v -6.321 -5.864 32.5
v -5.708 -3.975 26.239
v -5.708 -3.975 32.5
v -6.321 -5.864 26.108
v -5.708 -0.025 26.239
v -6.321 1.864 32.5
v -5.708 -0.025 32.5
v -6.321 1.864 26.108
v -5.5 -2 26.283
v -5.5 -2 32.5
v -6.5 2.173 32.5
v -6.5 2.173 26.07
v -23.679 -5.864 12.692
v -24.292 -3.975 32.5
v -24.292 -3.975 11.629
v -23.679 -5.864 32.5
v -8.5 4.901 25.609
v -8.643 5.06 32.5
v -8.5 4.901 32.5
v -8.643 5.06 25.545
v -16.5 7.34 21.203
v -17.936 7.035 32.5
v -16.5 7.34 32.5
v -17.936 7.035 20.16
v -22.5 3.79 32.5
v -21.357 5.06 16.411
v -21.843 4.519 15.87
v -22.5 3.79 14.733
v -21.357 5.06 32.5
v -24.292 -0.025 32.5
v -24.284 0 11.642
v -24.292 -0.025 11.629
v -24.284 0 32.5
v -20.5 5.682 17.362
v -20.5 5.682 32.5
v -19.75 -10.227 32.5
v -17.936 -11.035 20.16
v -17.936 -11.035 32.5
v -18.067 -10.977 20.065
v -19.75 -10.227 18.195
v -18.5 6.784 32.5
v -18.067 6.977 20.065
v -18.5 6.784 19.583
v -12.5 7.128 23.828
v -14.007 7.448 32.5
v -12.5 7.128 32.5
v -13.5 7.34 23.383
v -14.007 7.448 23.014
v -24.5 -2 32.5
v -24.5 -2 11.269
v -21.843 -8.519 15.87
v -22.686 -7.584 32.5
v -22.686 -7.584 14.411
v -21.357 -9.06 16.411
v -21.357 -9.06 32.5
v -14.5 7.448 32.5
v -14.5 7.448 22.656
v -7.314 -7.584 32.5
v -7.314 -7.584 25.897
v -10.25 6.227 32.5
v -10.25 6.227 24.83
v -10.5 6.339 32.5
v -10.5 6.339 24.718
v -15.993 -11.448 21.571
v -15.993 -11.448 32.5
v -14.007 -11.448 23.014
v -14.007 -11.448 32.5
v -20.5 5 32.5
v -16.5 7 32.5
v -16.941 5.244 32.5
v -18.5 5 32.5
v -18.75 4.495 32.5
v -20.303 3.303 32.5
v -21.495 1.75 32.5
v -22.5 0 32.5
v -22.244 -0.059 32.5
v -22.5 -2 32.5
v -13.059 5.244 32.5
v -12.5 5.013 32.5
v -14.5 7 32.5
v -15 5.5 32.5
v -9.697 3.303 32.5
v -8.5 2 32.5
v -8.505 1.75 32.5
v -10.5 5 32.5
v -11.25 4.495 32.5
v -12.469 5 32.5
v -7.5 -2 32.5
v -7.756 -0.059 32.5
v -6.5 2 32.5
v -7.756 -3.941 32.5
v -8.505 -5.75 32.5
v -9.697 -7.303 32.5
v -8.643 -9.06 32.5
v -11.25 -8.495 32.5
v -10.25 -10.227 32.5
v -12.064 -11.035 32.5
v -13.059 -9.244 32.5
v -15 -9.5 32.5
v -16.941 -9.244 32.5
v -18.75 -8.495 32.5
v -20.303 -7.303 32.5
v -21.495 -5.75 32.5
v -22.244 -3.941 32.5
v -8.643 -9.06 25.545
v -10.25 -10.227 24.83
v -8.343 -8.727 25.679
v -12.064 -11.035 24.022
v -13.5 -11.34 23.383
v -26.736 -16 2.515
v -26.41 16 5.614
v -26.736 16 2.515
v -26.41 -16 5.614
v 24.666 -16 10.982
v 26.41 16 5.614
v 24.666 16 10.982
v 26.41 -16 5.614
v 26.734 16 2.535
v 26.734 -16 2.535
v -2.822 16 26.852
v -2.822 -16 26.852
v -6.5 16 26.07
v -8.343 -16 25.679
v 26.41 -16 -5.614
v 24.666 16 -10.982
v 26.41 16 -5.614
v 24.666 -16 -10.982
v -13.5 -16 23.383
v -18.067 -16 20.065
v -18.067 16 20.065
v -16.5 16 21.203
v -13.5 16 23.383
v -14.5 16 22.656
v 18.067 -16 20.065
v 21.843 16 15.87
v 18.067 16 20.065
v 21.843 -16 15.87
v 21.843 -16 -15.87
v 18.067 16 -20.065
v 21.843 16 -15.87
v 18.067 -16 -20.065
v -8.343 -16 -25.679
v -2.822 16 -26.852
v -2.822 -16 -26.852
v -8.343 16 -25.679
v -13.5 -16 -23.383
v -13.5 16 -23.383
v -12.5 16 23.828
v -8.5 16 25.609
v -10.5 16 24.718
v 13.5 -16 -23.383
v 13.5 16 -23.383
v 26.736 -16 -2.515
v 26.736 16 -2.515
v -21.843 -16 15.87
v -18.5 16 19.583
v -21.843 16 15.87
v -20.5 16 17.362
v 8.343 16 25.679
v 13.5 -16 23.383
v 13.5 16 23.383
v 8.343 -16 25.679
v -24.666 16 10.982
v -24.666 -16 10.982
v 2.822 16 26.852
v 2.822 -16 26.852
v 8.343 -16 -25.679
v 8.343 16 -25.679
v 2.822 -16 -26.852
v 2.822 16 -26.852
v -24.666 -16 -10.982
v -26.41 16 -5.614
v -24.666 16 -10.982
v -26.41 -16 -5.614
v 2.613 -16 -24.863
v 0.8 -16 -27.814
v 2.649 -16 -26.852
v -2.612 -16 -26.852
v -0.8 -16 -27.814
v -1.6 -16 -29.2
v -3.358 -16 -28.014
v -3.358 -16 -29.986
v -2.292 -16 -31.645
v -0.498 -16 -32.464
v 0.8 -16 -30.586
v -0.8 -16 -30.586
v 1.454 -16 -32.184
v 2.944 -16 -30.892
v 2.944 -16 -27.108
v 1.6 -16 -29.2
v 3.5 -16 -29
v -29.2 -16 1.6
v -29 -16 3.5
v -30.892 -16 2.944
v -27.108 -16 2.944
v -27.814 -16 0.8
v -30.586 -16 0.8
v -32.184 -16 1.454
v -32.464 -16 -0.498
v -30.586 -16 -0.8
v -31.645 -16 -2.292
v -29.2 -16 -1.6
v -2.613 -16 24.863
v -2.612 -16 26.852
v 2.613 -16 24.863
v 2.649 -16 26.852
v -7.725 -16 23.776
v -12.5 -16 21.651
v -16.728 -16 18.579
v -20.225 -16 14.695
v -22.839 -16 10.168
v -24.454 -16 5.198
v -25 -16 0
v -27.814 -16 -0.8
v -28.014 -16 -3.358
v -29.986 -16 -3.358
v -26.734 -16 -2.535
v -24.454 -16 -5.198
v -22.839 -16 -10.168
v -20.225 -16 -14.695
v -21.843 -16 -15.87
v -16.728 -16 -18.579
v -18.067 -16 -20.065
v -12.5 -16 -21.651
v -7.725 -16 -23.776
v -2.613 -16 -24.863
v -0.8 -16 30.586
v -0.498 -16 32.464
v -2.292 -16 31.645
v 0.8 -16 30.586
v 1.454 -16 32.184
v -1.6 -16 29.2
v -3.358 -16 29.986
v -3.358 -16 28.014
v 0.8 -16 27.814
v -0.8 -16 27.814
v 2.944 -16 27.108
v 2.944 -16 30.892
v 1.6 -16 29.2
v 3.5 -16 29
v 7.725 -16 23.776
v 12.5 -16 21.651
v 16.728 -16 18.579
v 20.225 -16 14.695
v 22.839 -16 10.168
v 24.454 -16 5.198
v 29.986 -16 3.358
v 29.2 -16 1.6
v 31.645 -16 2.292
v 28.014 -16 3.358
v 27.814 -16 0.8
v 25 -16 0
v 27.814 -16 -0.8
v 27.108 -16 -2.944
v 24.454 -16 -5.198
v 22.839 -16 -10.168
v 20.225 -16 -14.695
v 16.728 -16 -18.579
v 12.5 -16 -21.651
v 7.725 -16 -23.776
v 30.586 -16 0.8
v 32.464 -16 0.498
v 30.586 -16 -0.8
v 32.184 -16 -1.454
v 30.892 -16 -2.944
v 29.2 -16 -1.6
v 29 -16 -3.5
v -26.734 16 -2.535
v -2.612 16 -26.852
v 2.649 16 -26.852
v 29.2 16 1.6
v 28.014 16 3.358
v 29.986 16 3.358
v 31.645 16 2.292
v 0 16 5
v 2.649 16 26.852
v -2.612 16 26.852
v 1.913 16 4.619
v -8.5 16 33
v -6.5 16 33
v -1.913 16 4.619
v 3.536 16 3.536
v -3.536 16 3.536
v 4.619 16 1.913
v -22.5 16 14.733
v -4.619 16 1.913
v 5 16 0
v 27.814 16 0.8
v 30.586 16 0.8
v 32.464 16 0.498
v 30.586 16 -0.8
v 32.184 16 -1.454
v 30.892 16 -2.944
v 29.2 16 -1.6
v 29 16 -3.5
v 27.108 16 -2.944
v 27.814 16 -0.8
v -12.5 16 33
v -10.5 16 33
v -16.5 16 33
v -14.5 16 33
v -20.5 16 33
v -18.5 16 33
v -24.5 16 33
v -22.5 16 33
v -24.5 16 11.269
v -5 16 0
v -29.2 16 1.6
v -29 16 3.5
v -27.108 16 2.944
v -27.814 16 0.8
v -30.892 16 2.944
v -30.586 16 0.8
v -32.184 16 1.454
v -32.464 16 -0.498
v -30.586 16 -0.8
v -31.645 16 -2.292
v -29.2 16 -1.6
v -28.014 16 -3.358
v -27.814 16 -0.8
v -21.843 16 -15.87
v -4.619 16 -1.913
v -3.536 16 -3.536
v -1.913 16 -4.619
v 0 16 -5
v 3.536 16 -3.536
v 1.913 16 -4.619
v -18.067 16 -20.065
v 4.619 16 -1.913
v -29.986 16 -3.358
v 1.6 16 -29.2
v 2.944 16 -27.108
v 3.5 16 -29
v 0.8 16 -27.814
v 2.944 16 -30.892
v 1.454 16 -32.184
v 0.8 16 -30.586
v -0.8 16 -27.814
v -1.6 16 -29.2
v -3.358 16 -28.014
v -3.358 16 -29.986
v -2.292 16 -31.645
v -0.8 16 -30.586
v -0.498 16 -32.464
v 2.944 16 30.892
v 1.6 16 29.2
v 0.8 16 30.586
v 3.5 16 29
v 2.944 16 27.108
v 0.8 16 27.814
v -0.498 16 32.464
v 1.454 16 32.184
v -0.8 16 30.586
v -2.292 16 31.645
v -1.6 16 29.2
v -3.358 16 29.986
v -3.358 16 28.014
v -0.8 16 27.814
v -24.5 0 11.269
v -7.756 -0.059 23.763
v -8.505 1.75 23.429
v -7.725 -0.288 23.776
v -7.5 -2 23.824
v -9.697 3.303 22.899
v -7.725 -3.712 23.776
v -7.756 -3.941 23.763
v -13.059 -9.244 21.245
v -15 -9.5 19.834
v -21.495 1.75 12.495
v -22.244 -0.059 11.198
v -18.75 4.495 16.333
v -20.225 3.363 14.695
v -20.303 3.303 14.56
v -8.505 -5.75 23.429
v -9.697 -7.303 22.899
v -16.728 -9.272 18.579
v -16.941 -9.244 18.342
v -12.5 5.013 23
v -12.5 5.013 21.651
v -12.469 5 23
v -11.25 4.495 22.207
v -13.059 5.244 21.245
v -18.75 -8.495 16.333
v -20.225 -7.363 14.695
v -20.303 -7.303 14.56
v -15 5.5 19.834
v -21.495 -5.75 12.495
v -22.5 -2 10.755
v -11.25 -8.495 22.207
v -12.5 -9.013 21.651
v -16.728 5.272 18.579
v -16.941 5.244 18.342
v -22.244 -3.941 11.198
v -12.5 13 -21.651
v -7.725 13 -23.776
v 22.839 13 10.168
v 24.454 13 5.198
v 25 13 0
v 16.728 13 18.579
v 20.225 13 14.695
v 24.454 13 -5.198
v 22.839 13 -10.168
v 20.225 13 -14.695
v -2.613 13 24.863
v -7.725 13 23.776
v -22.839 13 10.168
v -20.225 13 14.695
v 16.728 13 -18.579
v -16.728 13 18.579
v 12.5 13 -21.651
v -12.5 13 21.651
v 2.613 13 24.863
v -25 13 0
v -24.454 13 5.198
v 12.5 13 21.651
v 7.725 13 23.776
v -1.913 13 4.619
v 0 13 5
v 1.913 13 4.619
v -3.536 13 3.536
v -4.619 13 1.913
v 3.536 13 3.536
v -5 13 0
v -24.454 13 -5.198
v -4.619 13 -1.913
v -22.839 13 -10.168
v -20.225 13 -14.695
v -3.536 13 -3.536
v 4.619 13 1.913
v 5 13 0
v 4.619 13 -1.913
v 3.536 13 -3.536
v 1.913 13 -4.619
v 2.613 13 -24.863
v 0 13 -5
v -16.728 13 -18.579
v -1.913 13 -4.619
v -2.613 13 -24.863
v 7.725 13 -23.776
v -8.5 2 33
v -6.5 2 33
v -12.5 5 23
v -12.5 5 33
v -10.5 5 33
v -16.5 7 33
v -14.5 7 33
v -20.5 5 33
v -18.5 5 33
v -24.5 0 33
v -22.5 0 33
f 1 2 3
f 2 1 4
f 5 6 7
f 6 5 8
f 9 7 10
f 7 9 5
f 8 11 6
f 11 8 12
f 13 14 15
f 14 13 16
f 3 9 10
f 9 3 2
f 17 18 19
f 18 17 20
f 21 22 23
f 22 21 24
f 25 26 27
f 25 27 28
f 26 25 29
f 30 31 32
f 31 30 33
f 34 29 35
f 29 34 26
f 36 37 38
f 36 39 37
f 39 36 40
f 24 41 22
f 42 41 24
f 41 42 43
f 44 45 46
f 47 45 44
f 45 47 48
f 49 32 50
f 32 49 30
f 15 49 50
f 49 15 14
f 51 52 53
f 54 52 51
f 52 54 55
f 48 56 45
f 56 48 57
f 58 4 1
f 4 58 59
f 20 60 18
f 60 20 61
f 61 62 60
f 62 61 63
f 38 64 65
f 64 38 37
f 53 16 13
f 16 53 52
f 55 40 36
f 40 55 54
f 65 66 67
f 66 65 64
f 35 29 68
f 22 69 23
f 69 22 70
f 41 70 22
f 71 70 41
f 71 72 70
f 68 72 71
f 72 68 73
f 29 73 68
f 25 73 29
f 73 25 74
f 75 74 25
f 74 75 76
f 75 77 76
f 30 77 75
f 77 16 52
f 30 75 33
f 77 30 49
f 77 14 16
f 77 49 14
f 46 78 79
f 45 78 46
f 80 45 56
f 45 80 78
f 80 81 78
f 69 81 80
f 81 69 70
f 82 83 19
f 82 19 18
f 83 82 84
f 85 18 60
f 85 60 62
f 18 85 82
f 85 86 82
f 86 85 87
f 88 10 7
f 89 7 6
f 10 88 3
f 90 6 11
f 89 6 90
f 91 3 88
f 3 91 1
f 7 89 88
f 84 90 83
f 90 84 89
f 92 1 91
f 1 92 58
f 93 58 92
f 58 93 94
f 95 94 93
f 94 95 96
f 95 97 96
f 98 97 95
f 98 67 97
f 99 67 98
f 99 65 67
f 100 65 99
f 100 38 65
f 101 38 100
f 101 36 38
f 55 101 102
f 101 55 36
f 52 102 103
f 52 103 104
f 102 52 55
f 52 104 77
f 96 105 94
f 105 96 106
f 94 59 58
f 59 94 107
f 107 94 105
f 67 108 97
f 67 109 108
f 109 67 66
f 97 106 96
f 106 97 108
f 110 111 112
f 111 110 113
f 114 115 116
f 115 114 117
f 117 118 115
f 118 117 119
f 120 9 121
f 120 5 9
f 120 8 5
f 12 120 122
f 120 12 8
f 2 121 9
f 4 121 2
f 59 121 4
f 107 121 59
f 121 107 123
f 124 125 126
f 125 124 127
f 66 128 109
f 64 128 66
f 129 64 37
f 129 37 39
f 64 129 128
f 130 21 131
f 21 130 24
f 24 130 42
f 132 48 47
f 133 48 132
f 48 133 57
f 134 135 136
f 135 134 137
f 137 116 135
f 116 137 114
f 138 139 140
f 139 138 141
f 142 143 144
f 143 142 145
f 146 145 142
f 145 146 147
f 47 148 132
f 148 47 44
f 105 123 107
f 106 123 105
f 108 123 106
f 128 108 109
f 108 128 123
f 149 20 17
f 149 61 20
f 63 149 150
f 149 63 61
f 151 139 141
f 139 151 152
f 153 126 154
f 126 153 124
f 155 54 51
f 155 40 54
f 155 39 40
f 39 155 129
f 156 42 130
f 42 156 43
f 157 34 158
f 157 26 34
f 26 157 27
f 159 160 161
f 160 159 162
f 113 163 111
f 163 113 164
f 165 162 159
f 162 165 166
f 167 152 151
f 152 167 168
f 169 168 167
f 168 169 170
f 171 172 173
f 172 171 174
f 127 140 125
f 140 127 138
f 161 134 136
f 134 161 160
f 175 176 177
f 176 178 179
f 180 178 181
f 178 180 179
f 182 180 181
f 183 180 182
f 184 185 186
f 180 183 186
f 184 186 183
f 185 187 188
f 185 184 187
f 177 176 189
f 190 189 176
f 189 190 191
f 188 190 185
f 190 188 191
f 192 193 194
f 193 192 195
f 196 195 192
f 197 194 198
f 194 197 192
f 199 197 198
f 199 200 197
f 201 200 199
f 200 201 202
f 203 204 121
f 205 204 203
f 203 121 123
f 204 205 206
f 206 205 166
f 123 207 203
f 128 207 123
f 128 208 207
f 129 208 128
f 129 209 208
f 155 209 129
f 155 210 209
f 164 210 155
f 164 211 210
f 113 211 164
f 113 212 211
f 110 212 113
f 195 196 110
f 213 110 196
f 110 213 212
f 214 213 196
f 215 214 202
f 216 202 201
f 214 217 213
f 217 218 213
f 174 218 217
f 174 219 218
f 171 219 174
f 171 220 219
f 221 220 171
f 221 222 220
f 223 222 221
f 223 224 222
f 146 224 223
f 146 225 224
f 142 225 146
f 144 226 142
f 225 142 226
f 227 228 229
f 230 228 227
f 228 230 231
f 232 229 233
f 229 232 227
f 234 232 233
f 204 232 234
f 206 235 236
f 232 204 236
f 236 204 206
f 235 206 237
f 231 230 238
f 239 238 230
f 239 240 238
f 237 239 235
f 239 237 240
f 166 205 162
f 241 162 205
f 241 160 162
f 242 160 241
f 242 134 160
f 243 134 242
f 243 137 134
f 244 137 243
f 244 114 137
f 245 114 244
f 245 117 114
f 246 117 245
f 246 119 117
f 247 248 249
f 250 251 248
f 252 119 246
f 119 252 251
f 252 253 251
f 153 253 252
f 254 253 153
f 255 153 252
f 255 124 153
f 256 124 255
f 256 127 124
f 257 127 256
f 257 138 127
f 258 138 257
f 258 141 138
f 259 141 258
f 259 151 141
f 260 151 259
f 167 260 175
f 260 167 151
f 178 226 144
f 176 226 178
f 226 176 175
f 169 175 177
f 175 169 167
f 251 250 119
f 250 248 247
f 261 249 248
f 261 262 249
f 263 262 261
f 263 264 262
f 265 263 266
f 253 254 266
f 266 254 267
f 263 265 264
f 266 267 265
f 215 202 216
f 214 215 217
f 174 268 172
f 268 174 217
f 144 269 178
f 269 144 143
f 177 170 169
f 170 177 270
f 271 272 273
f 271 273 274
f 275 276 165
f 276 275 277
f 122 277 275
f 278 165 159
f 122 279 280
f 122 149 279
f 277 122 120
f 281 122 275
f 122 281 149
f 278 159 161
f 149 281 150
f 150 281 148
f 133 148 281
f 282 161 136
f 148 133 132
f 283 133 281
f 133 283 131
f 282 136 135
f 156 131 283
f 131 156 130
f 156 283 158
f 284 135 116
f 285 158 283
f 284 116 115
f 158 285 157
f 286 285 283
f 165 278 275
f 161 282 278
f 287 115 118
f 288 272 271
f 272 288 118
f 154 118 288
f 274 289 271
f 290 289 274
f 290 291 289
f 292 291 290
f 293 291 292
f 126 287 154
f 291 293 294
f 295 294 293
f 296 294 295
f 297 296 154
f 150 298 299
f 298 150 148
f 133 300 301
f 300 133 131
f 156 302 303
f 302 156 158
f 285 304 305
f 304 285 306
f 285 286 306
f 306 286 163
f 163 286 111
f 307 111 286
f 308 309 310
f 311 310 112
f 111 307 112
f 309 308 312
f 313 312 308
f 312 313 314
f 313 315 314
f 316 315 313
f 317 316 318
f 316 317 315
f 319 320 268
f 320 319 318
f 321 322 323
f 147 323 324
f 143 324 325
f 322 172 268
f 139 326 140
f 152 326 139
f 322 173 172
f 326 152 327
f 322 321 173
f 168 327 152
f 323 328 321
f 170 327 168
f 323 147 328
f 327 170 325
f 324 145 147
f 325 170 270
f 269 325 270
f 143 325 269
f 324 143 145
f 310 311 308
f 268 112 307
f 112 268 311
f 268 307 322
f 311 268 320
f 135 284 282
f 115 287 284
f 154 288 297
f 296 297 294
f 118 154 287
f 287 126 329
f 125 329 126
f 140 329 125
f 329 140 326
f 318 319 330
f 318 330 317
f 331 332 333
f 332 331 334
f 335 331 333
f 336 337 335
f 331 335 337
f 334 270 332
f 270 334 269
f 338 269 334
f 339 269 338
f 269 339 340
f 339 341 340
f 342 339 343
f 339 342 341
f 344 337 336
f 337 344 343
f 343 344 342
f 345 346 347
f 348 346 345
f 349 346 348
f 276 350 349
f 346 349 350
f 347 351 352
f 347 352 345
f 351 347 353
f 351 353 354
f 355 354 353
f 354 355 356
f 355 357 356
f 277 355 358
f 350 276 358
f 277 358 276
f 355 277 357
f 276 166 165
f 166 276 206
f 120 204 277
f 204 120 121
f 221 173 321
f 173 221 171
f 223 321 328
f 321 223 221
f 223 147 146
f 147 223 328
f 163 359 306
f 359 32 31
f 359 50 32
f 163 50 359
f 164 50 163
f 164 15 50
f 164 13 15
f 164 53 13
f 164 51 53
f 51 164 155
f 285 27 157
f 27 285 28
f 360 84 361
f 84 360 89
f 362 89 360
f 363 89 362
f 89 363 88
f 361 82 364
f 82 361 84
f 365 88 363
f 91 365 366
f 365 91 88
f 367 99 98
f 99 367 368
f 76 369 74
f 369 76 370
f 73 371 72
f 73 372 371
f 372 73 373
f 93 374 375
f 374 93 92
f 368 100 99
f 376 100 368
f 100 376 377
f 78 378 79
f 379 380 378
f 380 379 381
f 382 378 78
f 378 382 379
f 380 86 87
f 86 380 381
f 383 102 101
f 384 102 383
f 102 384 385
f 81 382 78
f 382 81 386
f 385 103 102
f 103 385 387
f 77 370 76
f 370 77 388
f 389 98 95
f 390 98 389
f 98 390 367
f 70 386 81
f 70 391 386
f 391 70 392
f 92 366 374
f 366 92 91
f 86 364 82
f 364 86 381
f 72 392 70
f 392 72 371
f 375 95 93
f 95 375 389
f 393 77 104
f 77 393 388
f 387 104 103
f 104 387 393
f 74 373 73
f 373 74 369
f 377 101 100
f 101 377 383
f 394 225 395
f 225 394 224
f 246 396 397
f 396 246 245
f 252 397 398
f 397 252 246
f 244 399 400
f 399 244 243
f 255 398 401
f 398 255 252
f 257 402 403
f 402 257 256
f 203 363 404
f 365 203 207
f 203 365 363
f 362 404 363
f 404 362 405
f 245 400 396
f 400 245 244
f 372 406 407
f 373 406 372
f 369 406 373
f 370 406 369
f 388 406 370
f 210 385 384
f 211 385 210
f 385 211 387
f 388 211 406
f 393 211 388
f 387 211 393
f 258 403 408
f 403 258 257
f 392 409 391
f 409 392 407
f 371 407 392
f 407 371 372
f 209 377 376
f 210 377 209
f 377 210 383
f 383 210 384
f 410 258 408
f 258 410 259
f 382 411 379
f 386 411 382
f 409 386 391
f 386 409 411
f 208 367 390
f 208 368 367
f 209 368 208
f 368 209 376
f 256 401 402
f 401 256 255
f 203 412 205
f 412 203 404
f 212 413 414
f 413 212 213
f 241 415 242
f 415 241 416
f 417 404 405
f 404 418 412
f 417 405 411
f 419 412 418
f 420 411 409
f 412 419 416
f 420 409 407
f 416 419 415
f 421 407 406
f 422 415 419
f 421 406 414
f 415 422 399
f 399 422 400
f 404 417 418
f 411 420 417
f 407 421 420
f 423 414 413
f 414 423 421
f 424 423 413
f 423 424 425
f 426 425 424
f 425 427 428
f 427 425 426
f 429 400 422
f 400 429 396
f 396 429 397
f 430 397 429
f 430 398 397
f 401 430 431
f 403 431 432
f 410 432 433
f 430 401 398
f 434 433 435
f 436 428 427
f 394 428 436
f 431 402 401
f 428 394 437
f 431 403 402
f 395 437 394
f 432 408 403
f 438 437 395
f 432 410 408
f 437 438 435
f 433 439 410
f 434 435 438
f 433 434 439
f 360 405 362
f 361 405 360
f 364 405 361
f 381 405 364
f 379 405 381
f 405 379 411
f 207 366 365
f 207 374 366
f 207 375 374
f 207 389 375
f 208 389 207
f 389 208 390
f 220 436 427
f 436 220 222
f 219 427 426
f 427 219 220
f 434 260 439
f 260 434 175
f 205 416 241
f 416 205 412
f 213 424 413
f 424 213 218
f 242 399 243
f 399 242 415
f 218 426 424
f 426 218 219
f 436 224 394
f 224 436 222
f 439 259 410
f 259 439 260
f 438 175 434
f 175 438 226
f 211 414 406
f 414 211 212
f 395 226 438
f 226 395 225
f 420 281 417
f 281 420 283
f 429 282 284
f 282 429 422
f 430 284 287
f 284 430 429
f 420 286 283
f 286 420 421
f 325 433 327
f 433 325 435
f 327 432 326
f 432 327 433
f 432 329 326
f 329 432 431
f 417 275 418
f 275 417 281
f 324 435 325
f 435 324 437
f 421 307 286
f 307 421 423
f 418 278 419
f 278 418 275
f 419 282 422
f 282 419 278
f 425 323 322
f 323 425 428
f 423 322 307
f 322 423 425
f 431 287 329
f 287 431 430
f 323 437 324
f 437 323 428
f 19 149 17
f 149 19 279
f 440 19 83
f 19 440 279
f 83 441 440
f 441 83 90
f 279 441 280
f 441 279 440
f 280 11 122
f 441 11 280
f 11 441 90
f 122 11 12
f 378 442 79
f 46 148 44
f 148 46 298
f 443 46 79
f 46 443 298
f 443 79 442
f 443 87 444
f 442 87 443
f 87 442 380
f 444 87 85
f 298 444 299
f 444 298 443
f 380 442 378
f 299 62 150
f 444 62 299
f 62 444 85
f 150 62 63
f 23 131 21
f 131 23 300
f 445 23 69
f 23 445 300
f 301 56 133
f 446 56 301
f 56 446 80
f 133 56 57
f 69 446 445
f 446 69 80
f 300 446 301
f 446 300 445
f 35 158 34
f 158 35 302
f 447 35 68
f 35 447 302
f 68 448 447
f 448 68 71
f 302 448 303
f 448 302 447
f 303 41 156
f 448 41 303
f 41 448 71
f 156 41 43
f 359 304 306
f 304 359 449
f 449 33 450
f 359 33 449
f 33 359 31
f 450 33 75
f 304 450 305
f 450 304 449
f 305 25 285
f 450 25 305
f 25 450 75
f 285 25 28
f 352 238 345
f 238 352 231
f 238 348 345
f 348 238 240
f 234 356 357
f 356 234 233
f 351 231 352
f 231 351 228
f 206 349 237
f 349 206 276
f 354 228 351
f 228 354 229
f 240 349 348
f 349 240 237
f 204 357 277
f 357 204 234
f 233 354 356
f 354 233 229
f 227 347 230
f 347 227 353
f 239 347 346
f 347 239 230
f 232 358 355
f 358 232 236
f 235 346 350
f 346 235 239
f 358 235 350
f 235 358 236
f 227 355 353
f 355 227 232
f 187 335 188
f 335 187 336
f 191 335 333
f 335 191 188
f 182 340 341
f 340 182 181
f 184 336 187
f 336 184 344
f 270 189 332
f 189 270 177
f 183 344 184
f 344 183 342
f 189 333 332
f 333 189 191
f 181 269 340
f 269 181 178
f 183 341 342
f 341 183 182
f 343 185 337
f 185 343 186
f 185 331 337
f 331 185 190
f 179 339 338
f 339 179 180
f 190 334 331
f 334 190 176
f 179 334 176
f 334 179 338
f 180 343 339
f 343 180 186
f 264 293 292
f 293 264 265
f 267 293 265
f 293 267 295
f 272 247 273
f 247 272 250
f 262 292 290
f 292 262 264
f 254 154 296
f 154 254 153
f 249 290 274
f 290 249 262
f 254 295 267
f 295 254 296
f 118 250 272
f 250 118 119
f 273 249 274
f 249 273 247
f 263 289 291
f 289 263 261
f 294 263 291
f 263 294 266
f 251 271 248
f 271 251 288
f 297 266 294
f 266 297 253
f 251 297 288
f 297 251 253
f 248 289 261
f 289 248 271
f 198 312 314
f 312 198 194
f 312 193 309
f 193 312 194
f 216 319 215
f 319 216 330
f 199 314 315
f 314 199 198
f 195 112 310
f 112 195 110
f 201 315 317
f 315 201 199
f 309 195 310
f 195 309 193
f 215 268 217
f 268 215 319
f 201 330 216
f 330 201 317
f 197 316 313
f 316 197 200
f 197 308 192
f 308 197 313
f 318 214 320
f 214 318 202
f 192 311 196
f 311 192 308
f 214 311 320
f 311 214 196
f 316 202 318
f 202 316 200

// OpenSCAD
difference(){
difference(){
    difference(){
        union(){
            translate([-15,-2,20])
                cylinder(h=25, r=9.5, center = true);
            rotate([90,0,0])
                cylinder(h=32,r=27,center=true);};
            translate([-15,-2,20])
                cylinder(h=25, r=7.5, center = true);};
            rotate([90,0,0])
            translate([0,0,2])
                cylinder(h=30,r=25,center=true);};
           
    rotate([90,0,0]) cylinder(h=40,r=5,center=true);}
                

module screw_hole(){
    difference(){
    rotate([90,0,0])
    translate([0,29,-16])
        cylinder(h=32,d=7);
    rotate([90,0,0])
    translate([0,29.2,-16])
        cylinder(h=32,d=3.2);}}

module supports(){
    rotate([90,0,0])
    translate([-8.5,25,-16])
    cube([2,8,14]);
    
    rotate([90,0,0])
    translate([-12.5,23,-16])
    cube([2,10,11]);
    
    rotate([90,0,0])
    translate([-16.5,21,-16])
    cube([2,12,9]);
    
    rotate([90,0,0])
    translate([-20.5,17,-16])
    cube([2,16,11]);
    
    rotate([90,0,0])
    translate([-24.5,11,-16])
    cube([2,22,16]);
}
supports();
screw_hole();
mirror([0,0,1])screw_hole();
        
rotate([0,90,0])
screw_hole();
rotate([0,-90,0])
screw_hole();        

    
